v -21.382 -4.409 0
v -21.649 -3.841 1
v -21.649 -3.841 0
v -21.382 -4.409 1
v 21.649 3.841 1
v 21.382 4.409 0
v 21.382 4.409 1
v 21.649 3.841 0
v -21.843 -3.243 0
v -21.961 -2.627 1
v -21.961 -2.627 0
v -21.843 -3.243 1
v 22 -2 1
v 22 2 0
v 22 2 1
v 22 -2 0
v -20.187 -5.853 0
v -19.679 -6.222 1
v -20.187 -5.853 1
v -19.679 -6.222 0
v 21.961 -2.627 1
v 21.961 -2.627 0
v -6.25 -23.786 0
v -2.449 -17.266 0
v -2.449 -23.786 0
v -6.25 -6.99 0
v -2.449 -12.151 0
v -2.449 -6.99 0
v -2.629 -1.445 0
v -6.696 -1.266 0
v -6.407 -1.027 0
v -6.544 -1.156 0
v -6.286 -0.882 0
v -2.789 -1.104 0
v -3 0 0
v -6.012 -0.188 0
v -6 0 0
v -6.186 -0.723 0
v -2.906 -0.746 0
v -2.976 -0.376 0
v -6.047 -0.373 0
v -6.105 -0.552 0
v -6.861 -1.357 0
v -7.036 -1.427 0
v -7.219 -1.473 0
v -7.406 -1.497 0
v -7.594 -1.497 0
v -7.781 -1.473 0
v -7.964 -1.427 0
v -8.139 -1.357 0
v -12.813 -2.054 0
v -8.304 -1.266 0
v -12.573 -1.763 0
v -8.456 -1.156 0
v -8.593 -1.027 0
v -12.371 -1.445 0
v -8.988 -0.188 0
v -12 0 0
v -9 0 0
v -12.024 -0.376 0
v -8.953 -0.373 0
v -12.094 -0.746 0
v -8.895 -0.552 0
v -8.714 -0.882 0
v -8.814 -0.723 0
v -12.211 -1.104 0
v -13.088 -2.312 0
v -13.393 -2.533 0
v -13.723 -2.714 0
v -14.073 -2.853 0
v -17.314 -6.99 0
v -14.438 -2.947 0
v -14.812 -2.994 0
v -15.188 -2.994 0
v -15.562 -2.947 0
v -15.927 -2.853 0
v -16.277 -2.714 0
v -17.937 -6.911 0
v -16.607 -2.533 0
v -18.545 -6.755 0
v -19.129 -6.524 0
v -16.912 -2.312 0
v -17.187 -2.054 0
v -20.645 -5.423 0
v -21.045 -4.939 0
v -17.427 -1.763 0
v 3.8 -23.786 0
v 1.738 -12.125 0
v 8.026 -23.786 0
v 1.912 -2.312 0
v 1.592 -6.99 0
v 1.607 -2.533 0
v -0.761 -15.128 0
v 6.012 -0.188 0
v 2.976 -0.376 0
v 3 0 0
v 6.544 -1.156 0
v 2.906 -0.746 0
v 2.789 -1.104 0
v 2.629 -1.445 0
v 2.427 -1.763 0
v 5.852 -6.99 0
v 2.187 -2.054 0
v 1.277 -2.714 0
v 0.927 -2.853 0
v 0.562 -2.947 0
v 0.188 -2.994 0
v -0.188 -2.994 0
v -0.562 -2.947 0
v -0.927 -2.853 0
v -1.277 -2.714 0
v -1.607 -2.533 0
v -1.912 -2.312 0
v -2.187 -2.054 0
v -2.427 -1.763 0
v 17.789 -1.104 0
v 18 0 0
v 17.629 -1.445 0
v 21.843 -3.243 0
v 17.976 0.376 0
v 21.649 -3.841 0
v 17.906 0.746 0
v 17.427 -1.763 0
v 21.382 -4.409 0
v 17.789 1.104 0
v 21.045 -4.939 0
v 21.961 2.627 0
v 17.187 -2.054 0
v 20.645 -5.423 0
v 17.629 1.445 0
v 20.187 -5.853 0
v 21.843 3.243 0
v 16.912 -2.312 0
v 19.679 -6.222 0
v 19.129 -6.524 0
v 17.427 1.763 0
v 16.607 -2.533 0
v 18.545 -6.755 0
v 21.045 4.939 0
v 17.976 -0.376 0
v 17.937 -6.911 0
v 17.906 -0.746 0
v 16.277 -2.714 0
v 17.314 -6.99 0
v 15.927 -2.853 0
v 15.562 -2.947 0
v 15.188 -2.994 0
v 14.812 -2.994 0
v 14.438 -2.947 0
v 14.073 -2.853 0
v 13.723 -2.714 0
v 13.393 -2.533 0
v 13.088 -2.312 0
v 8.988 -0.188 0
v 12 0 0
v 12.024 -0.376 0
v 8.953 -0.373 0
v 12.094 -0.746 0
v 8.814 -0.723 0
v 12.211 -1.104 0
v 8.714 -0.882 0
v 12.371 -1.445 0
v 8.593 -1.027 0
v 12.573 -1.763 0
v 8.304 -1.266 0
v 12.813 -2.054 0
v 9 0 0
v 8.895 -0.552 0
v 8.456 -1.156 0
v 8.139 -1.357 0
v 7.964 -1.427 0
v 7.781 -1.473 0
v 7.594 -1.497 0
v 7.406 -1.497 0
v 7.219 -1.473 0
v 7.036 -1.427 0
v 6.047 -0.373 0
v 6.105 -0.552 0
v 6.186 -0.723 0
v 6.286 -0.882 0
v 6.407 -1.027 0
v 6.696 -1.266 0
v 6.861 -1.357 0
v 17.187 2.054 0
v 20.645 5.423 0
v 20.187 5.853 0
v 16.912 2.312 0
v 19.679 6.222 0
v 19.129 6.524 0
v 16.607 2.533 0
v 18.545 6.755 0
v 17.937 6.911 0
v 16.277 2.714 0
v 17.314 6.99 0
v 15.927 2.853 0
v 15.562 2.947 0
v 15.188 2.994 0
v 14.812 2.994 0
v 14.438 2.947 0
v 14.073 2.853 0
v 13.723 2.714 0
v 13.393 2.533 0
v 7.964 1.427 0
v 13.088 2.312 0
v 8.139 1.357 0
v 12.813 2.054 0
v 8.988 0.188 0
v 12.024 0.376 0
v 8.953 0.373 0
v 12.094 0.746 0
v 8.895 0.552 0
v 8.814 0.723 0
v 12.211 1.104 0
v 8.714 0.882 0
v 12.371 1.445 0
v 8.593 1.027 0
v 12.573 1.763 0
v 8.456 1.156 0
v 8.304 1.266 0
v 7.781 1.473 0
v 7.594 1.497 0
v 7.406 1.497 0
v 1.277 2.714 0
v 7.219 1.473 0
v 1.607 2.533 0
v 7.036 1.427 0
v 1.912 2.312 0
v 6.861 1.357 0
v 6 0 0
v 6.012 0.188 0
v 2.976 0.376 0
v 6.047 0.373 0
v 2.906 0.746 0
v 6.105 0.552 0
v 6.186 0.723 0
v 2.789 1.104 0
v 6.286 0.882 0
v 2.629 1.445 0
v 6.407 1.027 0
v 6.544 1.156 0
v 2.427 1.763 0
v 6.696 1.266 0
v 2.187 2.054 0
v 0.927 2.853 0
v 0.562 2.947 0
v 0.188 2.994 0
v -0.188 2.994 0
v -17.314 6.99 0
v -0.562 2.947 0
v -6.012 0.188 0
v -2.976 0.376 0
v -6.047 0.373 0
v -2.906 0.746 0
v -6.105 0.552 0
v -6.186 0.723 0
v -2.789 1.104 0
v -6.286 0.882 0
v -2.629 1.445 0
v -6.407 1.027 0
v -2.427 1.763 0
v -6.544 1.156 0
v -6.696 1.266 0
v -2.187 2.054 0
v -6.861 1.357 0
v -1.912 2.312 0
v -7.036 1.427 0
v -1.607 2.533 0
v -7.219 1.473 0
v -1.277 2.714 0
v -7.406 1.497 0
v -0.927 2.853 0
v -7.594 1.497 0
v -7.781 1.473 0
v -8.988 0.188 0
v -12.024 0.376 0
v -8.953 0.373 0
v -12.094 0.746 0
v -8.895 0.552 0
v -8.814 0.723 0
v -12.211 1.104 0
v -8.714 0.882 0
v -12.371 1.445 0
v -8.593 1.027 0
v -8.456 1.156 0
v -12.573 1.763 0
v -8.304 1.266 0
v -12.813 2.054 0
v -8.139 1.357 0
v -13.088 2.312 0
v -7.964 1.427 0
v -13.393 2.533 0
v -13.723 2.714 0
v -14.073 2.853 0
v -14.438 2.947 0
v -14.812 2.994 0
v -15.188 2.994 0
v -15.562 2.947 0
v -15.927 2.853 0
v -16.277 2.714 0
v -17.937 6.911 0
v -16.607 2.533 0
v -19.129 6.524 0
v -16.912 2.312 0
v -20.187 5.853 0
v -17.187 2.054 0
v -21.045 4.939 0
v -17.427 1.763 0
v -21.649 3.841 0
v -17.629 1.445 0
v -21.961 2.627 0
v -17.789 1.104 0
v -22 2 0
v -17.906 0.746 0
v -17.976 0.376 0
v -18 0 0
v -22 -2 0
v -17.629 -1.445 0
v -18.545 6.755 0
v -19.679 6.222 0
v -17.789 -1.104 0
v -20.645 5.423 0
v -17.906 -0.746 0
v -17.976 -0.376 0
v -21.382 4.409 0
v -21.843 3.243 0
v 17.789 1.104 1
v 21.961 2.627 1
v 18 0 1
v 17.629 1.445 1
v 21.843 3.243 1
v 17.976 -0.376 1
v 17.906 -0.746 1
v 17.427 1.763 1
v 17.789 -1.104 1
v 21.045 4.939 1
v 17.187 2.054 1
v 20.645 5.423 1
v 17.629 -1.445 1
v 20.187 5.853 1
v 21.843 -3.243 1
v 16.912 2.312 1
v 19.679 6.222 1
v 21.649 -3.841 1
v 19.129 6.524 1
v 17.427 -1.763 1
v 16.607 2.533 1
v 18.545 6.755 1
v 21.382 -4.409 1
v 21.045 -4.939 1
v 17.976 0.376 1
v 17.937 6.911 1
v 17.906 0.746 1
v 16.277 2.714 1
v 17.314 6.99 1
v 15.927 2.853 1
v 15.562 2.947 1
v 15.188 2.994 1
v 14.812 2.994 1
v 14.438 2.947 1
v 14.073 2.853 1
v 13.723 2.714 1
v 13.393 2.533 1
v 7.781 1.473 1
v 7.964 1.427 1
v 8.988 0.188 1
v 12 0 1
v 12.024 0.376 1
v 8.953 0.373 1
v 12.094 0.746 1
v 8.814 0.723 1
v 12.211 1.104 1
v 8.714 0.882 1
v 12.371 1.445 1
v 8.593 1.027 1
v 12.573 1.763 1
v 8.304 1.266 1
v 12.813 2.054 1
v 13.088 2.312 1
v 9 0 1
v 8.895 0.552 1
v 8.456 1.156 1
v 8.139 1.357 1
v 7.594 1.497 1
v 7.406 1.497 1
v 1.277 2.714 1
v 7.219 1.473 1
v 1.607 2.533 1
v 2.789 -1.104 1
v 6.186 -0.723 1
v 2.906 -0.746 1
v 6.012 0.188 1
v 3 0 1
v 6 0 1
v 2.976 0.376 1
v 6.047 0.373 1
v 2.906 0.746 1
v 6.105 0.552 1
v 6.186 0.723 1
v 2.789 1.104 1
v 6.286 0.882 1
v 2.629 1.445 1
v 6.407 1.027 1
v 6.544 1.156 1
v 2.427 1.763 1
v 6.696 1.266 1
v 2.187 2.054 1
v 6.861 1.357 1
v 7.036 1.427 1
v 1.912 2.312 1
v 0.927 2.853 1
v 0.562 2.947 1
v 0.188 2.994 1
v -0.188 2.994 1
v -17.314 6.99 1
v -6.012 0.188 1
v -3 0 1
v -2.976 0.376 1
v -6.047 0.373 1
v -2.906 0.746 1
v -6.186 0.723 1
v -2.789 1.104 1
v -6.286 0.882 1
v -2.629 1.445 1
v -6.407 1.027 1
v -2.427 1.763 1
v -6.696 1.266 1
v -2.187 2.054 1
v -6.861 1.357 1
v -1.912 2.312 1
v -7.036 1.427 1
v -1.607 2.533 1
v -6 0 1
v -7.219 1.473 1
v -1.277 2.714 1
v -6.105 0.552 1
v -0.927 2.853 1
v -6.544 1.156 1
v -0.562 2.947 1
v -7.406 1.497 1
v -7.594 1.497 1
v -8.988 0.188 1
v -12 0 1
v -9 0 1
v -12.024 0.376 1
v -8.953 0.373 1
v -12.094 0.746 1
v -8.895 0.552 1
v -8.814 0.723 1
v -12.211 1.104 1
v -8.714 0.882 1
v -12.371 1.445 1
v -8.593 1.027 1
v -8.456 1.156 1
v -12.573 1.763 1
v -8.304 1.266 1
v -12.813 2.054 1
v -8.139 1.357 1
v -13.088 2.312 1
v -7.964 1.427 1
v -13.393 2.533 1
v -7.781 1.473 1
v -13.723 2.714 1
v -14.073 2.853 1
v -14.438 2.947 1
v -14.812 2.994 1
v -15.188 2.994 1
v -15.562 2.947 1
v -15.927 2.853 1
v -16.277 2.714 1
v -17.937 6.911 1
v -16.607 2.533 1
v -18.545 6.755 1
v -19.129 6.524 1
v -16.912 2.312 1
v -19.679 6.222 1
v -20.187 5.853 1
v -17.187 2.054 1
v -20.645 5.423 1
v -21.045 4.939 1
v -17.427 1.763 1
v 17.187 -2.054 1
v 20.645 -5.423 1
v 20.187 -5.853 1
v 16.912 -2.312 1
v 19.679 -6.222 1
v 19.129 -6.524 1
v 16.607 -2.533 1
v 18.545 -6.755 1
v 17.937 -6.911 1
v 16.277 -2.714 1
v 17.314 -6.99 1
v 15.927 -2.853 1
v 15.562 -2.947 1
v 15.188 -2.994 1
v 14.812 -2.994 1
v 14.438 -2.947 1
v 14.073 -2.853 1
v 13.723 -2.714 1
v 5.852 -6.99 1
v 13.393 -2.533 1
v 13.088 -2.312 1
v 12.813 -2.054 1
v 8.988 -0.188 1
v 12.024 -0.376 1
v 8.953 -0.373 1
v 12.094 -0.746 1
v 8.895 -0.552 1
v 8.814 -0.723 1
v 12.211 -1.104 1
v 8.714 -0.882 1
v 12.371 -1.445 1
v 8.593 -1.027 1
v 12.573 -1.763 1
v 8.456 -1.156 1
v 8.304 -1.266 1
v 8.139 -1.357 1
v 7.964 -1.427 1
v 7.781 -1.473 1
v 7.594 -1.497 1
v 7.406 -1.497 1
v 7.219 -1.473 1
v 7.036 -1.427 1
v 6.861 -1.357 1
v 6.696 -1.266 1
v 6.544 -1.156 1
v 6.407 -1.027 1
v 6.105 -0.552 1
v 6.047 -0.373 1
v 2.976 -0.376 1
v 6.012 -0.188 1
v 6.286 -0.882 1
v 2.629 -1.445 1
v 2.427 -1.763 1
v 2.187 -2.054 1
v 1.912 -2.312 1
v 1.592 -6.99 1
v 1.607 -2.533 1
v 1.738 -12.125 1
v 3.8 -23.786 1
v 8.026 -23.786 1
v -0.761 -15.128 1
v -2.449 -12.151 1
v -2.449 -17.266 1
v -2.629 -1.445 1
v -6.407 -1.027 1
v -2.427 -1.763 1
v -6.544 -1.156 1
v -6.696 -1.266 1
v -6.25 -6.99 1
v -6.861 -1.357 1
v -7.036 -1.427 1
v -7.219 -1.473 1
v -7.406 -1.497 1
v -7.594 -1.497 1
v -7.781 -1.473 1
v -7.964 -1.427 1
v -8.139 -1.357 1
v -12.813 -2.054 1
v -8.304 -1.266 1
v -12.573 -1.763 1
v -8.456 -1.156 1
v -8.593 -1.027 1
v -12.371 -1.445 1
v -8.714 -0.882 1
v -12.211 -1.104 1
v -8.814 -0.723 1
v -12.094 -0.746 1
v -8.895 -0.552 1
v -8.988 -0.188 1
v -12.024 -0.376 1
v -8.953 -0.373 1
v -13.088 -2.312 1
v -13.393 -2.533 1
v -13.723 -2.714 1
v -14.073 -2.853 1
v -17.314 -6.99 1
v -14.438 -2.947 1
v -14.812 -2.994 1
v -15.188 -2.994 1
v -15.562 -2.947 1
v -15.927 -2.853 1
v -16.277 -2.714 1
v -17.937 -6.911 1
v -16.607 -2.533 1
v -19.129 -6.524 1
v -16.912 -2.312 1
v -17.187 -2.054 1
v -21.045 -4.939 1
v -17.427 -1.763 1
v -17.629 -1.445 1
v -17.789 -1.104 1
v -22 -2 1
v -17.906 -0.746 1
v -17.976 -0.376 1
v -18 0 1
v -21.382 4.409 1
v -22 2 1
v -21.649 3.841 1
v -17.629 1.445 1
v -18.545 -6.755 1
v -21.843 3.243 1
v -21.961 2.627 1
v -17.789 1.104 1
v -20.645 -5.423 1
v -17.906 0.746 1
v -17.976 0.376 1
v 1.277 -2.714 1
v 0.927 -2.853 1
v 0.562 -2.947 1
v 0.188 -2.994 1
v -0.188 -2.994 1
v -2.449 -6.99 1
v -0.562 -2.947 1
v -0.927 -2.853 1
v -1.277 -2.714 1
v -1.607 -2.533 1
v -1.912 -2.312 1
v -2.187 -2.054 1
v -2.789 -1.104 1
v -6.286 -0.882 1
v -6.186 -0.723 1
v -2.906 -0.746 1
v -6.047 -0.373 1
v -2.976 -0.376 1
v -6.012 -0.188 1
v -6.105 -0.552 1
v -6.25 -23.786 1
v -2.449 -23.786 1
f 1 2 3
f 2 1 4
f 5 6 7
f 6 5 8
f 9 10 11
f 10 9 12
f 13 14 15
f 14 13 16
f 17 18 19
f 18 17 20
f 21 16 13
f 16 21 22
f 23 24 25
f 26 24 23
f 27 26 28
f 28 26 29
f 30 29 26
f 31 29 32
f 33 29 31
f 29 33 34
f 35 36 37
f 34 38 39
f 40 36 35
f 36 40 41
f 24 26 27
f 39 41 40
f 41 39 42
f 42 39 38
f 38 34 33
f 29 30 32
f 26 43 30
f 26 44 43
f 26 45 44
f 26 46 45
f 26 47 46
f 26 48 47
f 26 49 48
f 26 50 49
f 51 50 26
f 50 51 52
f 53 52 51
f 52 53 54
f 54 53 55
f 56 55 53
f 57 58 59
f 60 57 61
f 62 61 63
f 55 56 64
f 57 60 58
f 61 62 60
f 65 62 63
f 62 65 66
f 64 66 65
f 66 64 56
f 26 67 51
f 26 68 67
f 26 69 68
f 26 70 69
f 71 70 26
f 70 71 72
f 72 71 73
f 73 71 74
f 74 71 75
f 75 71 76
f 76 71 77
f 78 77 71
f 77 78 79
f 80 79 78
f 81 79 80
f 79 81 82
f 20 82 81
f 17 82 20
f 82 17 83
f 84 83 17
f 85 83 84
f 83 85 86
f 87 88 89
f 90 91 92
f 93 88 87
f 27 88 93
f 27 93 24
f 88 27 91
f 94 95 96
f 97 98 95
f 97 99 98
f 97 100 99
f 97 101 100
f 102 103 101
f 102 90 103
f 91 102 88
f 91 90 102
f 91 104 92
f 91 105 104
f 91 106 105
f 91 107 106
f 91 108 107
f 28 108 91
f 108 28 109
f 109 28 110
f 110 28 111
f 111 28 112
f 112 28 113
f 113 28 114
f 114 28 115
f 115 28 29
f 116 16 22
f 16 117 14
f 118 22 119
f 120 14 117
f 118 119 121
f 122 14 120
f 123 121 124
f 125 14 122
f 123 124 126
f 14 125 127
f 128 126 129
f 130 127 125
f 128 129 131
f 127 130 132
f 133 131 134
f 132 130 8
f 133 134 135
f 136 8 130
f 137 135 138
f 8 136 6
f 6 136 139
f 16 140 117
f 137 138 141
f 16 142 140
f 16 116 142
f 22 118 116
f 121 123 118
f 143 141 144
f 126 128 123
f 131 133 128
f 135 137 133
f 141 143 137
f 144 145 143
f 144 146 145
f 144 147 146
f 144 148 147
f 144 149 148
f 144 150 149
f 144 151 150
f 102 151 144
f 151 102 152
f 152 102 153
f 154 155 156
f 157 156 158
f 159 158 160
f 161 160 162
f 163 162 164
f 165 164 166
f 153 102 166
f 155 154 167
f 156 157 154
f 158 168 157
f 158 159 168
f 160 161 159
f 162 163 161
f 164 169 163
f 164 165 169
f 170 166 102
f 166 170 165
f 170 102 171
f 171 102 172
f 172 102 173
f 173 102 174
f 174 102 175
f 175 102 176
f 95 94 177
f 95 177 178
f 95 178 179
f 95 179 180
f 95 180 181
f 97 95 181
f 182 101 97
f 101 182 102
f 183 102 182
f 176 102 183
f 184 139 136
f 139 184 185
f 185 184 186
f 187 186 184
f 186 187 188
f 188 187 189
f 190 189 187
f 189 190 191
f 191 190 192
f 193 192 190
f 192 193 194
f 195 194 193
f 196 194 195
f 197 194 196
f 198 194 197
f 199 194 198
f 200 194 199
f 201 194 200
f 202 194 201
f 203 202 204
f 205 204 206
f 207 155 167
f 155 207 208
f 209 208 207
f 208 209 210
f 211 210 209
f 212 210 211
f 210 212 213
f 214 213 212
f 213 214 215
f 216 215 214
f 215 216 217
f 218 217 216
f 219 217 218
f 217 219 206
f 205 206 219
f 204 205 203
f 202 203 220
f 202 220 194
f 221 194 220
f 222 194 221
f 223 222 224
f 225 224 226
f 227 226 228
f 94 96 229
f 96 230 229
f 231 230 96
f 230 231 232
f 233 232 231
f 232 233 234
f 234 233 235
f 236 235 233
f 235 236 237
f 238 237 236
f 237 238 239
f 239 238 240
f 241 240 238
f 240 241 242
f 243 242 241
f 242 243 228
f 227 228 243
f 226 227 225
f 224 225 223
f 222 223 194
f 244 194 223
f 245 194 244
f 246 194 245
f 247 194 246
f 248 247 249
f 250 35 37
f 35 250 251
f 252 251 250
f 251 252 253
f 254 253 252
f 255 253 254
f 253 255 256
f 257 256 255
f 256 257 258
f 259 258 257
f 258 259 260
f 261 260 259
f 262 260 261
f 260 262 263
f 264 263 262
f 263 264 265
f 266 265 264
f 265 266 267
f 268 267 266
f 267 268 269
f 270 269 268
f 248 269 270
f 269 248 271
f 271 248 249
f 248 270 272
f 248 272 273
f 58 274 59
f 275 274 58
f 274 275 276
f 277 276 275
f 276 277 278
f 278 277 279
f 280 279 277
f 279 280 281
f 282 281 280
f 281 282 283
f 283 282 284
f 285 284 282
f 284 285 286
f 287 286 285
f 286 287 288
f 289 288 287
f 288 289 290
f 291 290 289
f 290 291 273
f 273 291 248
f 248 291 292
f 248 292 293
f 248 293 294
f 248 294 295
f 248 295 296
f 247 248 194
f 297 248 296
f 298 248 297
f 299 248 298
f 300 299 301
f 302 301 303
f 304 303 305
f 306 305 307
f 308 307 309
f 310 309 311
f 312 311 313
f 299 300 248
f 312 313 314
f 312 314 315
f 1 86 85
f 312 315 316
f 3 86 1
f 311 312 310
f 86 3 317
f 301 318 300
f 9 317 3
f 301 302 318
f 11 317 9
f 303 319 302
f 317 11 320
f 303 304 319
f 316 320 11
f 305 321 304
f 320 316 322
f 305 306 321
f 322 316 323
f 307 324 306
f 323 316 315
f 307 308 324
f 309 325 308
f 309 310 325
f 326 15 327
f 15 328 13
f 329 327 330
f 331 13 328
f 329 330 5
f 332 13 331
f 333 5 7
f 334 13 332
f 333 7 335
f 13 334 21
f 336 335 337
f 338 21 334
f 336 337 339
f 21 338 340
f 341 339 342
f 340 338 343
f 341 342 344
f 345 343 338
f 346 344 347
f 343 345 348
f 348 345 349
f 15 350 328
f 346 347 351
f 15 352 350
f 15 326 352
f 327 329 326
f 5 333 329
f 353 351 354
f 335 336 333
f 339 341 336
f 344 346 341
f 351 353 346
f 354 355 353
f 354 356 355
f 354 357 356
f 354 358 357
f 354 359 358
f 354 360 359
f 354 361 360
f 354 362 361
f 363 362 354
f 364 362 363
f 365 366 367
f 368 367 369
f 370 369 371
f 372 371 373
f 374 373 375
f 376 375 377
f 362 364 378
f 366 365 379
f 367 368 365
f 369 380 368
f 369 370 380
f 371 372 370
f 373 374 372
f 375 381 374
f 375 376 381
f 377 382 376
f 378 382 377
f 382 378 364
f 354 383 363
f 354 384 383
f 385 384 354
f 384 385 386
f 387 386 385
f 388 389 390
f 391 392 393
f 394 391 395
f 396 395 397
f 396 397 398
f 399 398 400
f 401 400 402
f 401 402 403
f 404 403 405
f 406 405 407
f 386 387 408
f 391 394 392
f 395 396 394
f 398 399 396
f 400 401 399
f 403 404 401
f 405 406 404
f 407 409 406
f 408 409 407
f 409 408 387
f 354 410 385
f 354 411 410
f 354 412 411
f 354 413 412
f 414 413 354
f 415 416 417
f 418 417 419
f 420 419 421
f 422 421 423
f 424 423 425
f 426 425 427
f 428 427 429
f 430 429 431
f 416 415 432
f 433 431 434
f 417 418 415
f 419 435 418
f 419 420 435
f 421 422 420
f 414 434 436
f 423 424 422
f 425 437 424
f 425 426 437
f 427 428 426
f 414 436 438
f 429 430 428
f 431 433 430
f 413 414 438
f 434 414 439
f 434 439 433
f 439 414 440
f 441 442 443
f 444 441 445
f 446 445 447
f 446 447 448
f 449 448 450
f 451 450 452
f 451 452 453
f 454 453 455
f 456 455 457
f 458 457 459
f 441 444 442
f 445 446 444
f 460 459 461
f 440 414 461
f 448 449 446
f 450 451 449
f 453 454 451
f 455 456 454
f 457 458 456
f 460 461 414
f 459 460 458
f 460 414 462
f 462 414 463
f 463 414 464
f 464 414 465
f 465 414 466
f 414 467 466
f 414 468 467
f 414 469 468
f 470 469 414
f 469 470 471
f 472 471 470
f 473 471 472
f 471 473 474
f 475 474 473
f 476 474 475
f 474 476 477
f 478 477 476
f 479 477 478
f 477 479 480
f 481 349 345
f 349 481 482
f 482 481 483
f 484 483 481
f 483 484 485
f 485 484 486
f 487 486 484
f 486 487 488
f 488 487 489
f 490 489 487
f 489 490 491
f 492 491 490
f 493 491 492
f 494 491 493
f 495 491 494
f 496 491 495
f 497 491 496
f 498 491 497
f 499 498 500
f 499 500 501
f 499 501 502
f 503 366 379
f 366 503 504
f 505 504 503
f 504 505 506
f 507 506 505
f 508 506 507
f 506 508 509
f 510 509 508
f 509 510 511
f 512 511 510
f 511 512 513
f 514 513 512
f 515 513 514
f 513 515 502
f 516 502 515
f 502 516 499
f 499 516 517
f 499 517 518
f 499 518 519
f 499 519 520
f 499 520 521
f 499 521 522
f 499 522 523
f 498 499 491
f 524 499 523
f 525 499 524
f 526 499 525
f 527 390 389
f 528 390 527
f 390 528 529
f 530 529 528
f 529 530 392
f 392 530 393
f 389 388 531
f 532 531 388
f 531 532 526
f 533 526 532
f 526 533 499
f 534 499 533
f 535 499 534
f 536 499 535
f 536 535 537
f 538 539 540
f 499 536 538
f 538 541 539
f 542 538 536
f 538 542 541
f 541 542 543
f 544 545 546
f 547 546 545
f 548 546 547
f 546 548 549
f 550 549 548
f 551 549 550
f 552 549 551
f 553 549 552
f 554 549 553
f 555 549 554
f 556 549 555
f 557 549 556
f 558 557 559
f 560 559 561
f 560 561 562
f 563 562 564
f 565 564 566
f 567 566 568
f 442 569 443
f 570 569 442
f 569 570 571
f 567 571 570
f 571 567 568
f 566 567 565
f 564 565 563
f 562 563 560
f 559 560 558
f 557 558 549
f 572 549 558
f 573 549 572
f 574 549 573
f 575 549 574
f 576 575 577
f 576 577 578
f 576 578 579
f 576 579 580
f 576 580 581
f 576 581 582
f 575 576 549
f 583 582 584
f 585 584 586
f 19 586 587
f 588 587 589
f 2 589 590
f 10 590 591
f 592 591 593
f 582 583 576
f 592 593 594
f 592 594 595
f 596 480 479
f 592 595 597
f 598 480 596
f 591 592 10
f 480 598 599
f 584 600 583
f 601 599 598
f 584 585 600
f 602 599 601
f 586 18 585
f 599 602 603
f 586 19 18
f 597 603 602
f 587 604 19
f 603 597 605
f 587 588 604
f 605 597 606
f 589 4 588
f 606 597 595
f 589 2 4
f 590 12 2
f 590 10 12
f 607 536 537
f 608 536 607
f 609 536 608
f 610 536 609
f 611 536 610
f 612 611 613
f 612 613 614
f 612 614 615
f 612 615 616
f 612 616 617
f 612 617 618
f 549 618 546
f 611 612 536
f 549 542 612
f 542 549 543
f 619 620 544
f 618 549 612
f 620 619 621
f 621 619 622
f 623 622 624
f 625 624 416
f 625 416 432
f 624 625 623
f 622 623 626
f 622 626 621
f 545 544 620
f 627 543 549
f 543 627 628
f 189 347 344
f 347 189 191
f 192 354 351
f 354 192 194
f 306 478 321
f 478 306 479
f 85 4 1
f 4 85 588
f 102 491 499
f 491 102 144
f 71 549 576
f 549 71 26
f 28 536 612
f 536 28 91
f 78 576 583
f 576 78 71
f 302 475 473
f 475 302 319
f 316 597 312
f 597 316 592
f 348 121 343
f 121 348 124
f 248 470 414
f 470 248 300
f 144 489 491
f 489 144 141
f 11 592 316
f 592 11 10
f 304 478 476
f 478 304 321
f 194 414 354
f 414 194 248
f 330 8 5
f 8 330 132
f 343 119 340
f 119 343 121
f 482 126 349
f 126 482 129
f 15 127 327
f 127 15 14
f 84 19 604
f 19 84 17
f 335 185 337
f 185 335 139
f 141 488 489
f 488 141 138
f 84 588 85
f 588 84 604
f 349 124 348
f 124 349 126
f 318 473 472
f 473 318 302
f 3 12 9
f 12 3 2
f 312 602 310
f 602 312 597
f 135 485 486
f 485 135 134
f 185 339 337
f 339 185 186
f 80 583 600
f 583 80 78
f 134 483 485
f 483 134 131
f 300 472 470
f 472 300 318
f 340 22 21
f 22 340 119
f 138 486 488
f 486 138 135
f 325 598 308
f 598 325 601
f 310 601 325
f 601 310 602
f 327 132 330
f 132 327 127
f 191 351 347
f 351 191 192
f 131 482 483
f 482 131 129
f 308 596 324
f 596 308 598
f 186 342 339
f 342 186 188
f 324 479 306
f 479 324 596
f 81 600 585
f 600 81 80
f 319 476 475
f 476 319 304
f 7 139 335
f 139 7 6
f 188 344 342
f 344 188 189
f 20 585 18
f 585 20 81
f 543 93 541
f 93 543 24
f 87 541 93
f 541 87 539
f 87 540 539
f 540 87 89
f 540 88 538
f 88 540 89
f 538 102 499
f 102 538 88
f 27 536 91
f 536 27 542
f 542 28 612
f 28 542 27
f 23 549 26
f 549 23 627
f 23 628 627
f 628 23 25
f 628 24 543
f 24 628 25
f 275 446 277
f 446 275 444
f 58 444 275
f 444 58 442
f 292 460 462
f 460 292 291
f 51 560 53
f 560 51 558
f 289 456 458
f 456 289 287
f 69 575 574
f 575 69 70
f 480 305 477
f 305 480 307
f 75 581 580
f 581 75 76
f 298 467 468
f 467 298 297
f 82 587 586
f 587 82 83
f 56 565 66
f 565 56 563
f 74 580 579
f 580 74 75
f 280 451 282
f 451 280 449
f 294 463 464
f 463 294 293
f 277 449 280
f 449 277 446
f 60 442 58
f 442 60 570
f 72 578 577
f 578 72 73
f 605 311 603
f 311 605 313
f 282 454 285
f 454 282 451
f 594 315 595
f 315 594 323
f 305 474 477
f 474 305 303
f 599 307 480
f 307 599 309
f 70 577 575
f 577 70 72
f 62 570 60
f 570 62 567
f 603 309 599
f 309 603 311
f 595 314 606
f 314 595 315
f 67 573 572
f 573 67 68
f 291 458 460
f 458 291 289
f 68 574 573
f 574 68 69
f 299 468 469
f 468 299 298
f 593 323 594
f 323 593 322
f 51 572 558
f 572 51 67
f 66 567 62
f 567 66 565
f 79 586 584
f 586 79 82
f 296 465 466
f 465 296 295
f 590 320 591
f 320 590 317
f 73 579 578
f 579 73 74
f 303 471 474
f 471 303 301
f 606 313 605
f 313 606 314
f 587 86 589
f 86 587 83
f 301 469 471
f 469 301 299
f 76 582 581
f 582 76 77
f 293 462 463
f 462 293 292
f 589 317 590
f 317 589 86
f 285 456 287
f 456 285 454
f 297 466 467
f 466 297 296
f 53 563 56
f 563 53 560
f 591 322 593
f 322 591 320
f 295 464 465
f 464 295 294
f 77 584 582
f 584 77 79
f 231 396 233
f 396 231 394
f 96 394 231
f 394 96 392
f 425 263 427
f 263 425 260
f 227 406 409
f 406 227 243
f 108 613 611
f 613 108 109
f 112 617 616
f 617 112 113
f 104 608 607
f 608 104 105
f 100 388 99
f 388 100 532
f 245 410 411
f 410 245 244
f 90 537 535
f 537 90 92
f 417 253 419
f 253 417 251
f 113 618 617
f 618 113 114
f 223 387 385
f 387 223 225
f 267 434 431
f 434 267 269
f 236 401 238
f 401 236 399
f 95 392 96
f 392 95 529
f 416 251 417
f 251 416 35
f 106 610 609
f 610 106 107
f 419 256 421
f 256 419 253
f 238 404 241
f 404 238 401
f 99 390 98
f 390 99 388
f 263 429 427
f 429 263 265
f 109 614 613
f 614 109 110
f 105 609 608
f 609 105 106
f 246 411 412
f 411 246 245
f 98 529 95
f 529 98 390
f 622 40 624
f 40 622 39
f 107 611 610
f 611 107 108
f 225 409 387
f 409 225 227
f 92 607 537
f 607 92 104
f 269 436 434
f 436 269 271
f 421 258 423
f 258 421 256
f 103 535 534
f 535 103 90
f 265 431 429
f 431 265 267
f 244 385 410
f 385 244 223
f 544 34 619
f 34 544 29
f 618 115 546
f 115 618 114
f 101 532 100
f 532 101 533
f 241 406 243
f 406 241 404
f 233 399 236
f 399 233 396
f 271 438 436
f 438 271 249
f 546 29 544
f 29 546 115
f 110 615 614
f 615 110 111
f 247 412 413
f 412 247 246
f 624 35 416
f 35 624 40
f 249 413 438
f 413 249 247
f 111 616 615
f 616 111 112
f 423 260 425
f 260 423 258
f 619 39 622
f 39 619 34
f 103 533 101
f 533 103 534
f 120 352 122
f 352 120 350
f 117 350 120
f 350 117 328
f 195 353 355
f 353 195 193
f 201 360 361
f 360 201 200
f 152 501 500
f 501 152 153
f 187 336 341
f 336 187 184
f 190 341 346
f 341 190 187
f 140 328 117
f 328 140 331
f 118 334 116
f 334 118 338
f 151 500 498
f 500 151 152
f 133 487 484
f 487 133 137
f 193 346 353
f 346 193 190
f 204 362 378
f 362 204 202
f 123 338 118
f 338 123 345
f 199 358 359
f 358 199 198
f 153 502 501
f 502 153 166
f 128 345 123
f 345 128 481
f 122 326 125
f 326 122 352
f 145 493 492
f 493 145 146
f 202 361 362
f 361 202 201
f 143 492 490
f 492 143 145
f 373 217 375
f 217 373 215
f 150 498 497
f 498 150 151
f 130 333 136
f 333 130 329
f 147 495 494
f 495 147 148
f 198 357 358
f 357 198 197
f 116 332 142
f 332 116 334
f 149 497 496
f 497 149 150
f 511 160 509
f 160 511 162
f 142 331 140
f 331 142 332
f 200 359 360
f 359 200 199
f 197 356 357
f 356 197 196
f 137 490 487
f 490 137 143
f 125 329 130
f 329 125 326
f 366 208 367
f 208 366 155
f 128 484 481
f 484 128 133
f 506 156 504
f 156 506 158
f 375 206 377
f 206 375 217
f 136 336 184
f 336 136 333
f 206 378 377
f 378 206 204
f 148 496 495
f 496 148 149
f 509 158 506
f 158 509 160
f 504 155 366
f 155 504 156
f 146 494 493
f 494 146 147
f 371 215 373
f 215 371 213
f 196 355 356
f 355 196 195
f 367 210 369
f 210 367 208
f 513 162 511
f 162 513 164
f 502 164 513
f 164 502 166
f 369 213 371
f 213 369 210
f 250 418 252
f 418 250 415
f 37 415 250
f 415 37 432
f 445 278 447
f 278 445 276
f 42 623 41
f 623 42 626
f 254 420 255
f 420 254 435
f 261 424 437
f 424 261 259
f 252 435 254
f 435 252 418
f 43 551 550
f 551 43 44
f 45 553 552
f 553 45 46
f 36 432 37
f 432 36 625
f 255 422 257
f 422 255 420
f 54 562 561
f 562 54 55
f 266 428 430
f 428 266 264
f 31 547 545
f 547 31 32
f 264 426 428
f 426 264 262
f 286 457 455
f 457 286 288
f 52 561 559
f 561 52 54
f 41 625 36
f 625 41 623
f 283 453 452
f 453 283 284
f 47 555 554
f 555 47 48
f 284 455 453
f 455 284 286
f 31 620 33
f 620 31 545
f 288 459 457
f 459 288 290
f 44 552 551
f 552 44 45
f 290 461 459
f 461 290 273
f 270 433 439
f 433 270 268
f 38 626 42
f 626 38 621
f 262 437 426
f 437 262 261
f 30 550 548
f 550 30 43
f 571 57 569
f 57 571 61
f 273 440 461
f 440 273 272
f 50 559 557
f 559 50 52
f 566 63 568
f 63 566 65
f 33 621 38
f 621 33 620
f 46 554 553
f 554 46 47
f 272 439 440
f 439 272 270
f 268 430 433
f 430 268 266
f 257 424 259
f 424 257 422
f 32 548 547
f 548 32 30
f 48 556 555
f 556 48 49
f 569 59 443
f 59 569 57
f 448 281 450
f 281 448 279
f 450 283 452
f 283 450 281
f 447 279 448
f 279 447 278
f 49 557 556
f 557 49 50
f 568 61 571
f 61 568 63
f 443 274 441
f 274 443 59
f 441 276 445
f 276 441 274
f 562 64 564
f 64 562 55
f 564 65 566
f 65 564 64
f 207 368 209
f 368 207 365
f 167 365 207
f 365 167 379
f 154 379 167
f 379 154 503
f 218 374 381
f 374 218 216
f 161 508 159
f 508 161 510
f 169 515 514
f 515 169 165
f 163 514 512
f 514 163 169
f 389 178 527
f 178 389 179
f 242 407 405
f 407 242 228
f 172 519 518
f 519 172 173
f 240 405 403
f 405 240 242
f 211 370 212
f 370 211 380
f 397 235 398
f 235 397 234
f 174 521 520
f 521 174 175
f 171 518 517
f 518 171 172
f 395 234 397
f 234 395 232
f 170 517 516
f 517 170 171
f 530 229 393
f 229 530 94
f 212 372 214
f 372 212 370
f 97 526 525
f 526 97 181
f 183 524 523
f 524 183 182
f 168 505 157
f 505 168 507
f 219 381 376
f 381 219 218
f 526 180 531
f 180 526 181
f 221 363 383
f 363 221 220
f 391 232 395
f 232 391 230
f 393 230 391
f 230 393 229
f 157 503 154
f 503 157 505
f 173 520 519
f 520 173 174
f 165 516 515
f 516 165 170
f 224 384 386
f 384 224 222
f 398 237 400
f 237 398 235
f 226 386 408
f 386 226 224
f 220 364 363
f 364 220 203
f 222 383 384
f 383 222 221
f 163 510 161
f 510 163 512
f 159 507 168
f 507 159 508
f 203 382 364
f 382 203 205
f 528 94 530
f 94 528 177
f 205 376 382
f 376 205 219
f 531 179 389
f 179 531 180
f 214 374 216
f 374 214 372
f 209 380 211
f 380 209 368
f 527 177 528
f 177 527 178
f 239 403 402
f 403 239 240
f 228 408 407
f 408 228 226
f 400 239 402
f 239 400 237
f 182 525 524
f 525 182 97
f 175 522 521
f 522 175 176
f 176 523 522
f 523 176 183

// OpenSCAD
$fn = 50;


difference() {
	union() {
		*color(alpha = 1.0000000000, c = "gray") {
			translate(v = [0, 14, 0]) {
				linear_extrude(height = 1) {
					text(font = "Arial:style=Bold", halign = "center", size = 4.5000000000, text = "COMMENT description oobb_plate_shape_p_type_1_depth_3_width_1_thickness_k_extra_oobb_size", valign = "center");
				}
			}
		}
		hull() {
			translate(v = [-17.0000000000, 2.0000000000, 0]) {
				cylinder(h = 1, r = 5);
			}
			translate(v = [17.0000000000, 2.0000000000, 0]) {
				cylinder(h = 1, r = 5);
			}
			translate(v = [-17.0000000000, -2.0000000000, 0]) {
				cylinder(h = 1, r = 5);
			}
			translate(v = [17.0000000000, -2.0000000000, 0]) {
				cylinder(h = 1, r = 5);
			}
		}
		translate(v = [0, -5, 0]) {
			linear_extrude(height = 1) {
				text(font = "DejaVu Sans Mono:style=Bold", halign = "center", size = 19.0000000000, text = "K", valign = "top");
			}
		}
	}
	union() {
		*color(alpha = 1.0000000000, c = "gray") {
			translate(v = [0, 14, 0]) {
				linear_extrude(height = 1) {
					text(font = "Arial:style=Bold", halign = "center", size = 4.5000000000, text = "COMMENT description oobb_holes_shape_n_type_3_width_1_thickness_k_extra_oobb_size_1_height_'all'_holes_true_both_holes", valign = "center");
				}
			}
		}
		translate(v = [-15.0000000000, 0.0000000000, 0]) {
			translate(v = [0, 0, -50]) {
				cylinder(h = 100, r = 3.0000000000);
			}
		}
		translate(v = [0, 0, -50]) {
			cylinder(h = 100, r = 3.0000000000);
		}
		translate(v = [15.0000000000, 0.0000000000, 0]) {
			translate(v = [0, 0, -50]) {
				cylinder(h = 100, r = 3.0000000000);
			}
		}
		translate(v = [-15.0000000000, 0.0000000000, 0]) {
			translate(v = [0, 0, -50]) {
				cylinder(h = 100, r = 1.5000000000);
			}
		}
		translate(v = [-7.5000000000, 0.0000000000, 0]) {
			translate(v = [0, 0, -50]) {
				cylinder(h = 100, r = 1.5000000000);
			}
		}
		translate(v = [0, 0, -50]) {
			cylinder(h = 100, r = 1.5000000000);
		}
		translate(v = [7.5000000000, 0.0000000000, 0]) {
			translate(v = [0, 0, -50]) {
				cylinder(h = 100, r = 1.5000000000);
			}
		}
		translate(v = [15.0000000000, 0.0000000000, 0]) {
			translate(v = [0, 0, -50]) {
				cylinder(h = 100, r = 1.5000000000);
			}
		}
	}
}
